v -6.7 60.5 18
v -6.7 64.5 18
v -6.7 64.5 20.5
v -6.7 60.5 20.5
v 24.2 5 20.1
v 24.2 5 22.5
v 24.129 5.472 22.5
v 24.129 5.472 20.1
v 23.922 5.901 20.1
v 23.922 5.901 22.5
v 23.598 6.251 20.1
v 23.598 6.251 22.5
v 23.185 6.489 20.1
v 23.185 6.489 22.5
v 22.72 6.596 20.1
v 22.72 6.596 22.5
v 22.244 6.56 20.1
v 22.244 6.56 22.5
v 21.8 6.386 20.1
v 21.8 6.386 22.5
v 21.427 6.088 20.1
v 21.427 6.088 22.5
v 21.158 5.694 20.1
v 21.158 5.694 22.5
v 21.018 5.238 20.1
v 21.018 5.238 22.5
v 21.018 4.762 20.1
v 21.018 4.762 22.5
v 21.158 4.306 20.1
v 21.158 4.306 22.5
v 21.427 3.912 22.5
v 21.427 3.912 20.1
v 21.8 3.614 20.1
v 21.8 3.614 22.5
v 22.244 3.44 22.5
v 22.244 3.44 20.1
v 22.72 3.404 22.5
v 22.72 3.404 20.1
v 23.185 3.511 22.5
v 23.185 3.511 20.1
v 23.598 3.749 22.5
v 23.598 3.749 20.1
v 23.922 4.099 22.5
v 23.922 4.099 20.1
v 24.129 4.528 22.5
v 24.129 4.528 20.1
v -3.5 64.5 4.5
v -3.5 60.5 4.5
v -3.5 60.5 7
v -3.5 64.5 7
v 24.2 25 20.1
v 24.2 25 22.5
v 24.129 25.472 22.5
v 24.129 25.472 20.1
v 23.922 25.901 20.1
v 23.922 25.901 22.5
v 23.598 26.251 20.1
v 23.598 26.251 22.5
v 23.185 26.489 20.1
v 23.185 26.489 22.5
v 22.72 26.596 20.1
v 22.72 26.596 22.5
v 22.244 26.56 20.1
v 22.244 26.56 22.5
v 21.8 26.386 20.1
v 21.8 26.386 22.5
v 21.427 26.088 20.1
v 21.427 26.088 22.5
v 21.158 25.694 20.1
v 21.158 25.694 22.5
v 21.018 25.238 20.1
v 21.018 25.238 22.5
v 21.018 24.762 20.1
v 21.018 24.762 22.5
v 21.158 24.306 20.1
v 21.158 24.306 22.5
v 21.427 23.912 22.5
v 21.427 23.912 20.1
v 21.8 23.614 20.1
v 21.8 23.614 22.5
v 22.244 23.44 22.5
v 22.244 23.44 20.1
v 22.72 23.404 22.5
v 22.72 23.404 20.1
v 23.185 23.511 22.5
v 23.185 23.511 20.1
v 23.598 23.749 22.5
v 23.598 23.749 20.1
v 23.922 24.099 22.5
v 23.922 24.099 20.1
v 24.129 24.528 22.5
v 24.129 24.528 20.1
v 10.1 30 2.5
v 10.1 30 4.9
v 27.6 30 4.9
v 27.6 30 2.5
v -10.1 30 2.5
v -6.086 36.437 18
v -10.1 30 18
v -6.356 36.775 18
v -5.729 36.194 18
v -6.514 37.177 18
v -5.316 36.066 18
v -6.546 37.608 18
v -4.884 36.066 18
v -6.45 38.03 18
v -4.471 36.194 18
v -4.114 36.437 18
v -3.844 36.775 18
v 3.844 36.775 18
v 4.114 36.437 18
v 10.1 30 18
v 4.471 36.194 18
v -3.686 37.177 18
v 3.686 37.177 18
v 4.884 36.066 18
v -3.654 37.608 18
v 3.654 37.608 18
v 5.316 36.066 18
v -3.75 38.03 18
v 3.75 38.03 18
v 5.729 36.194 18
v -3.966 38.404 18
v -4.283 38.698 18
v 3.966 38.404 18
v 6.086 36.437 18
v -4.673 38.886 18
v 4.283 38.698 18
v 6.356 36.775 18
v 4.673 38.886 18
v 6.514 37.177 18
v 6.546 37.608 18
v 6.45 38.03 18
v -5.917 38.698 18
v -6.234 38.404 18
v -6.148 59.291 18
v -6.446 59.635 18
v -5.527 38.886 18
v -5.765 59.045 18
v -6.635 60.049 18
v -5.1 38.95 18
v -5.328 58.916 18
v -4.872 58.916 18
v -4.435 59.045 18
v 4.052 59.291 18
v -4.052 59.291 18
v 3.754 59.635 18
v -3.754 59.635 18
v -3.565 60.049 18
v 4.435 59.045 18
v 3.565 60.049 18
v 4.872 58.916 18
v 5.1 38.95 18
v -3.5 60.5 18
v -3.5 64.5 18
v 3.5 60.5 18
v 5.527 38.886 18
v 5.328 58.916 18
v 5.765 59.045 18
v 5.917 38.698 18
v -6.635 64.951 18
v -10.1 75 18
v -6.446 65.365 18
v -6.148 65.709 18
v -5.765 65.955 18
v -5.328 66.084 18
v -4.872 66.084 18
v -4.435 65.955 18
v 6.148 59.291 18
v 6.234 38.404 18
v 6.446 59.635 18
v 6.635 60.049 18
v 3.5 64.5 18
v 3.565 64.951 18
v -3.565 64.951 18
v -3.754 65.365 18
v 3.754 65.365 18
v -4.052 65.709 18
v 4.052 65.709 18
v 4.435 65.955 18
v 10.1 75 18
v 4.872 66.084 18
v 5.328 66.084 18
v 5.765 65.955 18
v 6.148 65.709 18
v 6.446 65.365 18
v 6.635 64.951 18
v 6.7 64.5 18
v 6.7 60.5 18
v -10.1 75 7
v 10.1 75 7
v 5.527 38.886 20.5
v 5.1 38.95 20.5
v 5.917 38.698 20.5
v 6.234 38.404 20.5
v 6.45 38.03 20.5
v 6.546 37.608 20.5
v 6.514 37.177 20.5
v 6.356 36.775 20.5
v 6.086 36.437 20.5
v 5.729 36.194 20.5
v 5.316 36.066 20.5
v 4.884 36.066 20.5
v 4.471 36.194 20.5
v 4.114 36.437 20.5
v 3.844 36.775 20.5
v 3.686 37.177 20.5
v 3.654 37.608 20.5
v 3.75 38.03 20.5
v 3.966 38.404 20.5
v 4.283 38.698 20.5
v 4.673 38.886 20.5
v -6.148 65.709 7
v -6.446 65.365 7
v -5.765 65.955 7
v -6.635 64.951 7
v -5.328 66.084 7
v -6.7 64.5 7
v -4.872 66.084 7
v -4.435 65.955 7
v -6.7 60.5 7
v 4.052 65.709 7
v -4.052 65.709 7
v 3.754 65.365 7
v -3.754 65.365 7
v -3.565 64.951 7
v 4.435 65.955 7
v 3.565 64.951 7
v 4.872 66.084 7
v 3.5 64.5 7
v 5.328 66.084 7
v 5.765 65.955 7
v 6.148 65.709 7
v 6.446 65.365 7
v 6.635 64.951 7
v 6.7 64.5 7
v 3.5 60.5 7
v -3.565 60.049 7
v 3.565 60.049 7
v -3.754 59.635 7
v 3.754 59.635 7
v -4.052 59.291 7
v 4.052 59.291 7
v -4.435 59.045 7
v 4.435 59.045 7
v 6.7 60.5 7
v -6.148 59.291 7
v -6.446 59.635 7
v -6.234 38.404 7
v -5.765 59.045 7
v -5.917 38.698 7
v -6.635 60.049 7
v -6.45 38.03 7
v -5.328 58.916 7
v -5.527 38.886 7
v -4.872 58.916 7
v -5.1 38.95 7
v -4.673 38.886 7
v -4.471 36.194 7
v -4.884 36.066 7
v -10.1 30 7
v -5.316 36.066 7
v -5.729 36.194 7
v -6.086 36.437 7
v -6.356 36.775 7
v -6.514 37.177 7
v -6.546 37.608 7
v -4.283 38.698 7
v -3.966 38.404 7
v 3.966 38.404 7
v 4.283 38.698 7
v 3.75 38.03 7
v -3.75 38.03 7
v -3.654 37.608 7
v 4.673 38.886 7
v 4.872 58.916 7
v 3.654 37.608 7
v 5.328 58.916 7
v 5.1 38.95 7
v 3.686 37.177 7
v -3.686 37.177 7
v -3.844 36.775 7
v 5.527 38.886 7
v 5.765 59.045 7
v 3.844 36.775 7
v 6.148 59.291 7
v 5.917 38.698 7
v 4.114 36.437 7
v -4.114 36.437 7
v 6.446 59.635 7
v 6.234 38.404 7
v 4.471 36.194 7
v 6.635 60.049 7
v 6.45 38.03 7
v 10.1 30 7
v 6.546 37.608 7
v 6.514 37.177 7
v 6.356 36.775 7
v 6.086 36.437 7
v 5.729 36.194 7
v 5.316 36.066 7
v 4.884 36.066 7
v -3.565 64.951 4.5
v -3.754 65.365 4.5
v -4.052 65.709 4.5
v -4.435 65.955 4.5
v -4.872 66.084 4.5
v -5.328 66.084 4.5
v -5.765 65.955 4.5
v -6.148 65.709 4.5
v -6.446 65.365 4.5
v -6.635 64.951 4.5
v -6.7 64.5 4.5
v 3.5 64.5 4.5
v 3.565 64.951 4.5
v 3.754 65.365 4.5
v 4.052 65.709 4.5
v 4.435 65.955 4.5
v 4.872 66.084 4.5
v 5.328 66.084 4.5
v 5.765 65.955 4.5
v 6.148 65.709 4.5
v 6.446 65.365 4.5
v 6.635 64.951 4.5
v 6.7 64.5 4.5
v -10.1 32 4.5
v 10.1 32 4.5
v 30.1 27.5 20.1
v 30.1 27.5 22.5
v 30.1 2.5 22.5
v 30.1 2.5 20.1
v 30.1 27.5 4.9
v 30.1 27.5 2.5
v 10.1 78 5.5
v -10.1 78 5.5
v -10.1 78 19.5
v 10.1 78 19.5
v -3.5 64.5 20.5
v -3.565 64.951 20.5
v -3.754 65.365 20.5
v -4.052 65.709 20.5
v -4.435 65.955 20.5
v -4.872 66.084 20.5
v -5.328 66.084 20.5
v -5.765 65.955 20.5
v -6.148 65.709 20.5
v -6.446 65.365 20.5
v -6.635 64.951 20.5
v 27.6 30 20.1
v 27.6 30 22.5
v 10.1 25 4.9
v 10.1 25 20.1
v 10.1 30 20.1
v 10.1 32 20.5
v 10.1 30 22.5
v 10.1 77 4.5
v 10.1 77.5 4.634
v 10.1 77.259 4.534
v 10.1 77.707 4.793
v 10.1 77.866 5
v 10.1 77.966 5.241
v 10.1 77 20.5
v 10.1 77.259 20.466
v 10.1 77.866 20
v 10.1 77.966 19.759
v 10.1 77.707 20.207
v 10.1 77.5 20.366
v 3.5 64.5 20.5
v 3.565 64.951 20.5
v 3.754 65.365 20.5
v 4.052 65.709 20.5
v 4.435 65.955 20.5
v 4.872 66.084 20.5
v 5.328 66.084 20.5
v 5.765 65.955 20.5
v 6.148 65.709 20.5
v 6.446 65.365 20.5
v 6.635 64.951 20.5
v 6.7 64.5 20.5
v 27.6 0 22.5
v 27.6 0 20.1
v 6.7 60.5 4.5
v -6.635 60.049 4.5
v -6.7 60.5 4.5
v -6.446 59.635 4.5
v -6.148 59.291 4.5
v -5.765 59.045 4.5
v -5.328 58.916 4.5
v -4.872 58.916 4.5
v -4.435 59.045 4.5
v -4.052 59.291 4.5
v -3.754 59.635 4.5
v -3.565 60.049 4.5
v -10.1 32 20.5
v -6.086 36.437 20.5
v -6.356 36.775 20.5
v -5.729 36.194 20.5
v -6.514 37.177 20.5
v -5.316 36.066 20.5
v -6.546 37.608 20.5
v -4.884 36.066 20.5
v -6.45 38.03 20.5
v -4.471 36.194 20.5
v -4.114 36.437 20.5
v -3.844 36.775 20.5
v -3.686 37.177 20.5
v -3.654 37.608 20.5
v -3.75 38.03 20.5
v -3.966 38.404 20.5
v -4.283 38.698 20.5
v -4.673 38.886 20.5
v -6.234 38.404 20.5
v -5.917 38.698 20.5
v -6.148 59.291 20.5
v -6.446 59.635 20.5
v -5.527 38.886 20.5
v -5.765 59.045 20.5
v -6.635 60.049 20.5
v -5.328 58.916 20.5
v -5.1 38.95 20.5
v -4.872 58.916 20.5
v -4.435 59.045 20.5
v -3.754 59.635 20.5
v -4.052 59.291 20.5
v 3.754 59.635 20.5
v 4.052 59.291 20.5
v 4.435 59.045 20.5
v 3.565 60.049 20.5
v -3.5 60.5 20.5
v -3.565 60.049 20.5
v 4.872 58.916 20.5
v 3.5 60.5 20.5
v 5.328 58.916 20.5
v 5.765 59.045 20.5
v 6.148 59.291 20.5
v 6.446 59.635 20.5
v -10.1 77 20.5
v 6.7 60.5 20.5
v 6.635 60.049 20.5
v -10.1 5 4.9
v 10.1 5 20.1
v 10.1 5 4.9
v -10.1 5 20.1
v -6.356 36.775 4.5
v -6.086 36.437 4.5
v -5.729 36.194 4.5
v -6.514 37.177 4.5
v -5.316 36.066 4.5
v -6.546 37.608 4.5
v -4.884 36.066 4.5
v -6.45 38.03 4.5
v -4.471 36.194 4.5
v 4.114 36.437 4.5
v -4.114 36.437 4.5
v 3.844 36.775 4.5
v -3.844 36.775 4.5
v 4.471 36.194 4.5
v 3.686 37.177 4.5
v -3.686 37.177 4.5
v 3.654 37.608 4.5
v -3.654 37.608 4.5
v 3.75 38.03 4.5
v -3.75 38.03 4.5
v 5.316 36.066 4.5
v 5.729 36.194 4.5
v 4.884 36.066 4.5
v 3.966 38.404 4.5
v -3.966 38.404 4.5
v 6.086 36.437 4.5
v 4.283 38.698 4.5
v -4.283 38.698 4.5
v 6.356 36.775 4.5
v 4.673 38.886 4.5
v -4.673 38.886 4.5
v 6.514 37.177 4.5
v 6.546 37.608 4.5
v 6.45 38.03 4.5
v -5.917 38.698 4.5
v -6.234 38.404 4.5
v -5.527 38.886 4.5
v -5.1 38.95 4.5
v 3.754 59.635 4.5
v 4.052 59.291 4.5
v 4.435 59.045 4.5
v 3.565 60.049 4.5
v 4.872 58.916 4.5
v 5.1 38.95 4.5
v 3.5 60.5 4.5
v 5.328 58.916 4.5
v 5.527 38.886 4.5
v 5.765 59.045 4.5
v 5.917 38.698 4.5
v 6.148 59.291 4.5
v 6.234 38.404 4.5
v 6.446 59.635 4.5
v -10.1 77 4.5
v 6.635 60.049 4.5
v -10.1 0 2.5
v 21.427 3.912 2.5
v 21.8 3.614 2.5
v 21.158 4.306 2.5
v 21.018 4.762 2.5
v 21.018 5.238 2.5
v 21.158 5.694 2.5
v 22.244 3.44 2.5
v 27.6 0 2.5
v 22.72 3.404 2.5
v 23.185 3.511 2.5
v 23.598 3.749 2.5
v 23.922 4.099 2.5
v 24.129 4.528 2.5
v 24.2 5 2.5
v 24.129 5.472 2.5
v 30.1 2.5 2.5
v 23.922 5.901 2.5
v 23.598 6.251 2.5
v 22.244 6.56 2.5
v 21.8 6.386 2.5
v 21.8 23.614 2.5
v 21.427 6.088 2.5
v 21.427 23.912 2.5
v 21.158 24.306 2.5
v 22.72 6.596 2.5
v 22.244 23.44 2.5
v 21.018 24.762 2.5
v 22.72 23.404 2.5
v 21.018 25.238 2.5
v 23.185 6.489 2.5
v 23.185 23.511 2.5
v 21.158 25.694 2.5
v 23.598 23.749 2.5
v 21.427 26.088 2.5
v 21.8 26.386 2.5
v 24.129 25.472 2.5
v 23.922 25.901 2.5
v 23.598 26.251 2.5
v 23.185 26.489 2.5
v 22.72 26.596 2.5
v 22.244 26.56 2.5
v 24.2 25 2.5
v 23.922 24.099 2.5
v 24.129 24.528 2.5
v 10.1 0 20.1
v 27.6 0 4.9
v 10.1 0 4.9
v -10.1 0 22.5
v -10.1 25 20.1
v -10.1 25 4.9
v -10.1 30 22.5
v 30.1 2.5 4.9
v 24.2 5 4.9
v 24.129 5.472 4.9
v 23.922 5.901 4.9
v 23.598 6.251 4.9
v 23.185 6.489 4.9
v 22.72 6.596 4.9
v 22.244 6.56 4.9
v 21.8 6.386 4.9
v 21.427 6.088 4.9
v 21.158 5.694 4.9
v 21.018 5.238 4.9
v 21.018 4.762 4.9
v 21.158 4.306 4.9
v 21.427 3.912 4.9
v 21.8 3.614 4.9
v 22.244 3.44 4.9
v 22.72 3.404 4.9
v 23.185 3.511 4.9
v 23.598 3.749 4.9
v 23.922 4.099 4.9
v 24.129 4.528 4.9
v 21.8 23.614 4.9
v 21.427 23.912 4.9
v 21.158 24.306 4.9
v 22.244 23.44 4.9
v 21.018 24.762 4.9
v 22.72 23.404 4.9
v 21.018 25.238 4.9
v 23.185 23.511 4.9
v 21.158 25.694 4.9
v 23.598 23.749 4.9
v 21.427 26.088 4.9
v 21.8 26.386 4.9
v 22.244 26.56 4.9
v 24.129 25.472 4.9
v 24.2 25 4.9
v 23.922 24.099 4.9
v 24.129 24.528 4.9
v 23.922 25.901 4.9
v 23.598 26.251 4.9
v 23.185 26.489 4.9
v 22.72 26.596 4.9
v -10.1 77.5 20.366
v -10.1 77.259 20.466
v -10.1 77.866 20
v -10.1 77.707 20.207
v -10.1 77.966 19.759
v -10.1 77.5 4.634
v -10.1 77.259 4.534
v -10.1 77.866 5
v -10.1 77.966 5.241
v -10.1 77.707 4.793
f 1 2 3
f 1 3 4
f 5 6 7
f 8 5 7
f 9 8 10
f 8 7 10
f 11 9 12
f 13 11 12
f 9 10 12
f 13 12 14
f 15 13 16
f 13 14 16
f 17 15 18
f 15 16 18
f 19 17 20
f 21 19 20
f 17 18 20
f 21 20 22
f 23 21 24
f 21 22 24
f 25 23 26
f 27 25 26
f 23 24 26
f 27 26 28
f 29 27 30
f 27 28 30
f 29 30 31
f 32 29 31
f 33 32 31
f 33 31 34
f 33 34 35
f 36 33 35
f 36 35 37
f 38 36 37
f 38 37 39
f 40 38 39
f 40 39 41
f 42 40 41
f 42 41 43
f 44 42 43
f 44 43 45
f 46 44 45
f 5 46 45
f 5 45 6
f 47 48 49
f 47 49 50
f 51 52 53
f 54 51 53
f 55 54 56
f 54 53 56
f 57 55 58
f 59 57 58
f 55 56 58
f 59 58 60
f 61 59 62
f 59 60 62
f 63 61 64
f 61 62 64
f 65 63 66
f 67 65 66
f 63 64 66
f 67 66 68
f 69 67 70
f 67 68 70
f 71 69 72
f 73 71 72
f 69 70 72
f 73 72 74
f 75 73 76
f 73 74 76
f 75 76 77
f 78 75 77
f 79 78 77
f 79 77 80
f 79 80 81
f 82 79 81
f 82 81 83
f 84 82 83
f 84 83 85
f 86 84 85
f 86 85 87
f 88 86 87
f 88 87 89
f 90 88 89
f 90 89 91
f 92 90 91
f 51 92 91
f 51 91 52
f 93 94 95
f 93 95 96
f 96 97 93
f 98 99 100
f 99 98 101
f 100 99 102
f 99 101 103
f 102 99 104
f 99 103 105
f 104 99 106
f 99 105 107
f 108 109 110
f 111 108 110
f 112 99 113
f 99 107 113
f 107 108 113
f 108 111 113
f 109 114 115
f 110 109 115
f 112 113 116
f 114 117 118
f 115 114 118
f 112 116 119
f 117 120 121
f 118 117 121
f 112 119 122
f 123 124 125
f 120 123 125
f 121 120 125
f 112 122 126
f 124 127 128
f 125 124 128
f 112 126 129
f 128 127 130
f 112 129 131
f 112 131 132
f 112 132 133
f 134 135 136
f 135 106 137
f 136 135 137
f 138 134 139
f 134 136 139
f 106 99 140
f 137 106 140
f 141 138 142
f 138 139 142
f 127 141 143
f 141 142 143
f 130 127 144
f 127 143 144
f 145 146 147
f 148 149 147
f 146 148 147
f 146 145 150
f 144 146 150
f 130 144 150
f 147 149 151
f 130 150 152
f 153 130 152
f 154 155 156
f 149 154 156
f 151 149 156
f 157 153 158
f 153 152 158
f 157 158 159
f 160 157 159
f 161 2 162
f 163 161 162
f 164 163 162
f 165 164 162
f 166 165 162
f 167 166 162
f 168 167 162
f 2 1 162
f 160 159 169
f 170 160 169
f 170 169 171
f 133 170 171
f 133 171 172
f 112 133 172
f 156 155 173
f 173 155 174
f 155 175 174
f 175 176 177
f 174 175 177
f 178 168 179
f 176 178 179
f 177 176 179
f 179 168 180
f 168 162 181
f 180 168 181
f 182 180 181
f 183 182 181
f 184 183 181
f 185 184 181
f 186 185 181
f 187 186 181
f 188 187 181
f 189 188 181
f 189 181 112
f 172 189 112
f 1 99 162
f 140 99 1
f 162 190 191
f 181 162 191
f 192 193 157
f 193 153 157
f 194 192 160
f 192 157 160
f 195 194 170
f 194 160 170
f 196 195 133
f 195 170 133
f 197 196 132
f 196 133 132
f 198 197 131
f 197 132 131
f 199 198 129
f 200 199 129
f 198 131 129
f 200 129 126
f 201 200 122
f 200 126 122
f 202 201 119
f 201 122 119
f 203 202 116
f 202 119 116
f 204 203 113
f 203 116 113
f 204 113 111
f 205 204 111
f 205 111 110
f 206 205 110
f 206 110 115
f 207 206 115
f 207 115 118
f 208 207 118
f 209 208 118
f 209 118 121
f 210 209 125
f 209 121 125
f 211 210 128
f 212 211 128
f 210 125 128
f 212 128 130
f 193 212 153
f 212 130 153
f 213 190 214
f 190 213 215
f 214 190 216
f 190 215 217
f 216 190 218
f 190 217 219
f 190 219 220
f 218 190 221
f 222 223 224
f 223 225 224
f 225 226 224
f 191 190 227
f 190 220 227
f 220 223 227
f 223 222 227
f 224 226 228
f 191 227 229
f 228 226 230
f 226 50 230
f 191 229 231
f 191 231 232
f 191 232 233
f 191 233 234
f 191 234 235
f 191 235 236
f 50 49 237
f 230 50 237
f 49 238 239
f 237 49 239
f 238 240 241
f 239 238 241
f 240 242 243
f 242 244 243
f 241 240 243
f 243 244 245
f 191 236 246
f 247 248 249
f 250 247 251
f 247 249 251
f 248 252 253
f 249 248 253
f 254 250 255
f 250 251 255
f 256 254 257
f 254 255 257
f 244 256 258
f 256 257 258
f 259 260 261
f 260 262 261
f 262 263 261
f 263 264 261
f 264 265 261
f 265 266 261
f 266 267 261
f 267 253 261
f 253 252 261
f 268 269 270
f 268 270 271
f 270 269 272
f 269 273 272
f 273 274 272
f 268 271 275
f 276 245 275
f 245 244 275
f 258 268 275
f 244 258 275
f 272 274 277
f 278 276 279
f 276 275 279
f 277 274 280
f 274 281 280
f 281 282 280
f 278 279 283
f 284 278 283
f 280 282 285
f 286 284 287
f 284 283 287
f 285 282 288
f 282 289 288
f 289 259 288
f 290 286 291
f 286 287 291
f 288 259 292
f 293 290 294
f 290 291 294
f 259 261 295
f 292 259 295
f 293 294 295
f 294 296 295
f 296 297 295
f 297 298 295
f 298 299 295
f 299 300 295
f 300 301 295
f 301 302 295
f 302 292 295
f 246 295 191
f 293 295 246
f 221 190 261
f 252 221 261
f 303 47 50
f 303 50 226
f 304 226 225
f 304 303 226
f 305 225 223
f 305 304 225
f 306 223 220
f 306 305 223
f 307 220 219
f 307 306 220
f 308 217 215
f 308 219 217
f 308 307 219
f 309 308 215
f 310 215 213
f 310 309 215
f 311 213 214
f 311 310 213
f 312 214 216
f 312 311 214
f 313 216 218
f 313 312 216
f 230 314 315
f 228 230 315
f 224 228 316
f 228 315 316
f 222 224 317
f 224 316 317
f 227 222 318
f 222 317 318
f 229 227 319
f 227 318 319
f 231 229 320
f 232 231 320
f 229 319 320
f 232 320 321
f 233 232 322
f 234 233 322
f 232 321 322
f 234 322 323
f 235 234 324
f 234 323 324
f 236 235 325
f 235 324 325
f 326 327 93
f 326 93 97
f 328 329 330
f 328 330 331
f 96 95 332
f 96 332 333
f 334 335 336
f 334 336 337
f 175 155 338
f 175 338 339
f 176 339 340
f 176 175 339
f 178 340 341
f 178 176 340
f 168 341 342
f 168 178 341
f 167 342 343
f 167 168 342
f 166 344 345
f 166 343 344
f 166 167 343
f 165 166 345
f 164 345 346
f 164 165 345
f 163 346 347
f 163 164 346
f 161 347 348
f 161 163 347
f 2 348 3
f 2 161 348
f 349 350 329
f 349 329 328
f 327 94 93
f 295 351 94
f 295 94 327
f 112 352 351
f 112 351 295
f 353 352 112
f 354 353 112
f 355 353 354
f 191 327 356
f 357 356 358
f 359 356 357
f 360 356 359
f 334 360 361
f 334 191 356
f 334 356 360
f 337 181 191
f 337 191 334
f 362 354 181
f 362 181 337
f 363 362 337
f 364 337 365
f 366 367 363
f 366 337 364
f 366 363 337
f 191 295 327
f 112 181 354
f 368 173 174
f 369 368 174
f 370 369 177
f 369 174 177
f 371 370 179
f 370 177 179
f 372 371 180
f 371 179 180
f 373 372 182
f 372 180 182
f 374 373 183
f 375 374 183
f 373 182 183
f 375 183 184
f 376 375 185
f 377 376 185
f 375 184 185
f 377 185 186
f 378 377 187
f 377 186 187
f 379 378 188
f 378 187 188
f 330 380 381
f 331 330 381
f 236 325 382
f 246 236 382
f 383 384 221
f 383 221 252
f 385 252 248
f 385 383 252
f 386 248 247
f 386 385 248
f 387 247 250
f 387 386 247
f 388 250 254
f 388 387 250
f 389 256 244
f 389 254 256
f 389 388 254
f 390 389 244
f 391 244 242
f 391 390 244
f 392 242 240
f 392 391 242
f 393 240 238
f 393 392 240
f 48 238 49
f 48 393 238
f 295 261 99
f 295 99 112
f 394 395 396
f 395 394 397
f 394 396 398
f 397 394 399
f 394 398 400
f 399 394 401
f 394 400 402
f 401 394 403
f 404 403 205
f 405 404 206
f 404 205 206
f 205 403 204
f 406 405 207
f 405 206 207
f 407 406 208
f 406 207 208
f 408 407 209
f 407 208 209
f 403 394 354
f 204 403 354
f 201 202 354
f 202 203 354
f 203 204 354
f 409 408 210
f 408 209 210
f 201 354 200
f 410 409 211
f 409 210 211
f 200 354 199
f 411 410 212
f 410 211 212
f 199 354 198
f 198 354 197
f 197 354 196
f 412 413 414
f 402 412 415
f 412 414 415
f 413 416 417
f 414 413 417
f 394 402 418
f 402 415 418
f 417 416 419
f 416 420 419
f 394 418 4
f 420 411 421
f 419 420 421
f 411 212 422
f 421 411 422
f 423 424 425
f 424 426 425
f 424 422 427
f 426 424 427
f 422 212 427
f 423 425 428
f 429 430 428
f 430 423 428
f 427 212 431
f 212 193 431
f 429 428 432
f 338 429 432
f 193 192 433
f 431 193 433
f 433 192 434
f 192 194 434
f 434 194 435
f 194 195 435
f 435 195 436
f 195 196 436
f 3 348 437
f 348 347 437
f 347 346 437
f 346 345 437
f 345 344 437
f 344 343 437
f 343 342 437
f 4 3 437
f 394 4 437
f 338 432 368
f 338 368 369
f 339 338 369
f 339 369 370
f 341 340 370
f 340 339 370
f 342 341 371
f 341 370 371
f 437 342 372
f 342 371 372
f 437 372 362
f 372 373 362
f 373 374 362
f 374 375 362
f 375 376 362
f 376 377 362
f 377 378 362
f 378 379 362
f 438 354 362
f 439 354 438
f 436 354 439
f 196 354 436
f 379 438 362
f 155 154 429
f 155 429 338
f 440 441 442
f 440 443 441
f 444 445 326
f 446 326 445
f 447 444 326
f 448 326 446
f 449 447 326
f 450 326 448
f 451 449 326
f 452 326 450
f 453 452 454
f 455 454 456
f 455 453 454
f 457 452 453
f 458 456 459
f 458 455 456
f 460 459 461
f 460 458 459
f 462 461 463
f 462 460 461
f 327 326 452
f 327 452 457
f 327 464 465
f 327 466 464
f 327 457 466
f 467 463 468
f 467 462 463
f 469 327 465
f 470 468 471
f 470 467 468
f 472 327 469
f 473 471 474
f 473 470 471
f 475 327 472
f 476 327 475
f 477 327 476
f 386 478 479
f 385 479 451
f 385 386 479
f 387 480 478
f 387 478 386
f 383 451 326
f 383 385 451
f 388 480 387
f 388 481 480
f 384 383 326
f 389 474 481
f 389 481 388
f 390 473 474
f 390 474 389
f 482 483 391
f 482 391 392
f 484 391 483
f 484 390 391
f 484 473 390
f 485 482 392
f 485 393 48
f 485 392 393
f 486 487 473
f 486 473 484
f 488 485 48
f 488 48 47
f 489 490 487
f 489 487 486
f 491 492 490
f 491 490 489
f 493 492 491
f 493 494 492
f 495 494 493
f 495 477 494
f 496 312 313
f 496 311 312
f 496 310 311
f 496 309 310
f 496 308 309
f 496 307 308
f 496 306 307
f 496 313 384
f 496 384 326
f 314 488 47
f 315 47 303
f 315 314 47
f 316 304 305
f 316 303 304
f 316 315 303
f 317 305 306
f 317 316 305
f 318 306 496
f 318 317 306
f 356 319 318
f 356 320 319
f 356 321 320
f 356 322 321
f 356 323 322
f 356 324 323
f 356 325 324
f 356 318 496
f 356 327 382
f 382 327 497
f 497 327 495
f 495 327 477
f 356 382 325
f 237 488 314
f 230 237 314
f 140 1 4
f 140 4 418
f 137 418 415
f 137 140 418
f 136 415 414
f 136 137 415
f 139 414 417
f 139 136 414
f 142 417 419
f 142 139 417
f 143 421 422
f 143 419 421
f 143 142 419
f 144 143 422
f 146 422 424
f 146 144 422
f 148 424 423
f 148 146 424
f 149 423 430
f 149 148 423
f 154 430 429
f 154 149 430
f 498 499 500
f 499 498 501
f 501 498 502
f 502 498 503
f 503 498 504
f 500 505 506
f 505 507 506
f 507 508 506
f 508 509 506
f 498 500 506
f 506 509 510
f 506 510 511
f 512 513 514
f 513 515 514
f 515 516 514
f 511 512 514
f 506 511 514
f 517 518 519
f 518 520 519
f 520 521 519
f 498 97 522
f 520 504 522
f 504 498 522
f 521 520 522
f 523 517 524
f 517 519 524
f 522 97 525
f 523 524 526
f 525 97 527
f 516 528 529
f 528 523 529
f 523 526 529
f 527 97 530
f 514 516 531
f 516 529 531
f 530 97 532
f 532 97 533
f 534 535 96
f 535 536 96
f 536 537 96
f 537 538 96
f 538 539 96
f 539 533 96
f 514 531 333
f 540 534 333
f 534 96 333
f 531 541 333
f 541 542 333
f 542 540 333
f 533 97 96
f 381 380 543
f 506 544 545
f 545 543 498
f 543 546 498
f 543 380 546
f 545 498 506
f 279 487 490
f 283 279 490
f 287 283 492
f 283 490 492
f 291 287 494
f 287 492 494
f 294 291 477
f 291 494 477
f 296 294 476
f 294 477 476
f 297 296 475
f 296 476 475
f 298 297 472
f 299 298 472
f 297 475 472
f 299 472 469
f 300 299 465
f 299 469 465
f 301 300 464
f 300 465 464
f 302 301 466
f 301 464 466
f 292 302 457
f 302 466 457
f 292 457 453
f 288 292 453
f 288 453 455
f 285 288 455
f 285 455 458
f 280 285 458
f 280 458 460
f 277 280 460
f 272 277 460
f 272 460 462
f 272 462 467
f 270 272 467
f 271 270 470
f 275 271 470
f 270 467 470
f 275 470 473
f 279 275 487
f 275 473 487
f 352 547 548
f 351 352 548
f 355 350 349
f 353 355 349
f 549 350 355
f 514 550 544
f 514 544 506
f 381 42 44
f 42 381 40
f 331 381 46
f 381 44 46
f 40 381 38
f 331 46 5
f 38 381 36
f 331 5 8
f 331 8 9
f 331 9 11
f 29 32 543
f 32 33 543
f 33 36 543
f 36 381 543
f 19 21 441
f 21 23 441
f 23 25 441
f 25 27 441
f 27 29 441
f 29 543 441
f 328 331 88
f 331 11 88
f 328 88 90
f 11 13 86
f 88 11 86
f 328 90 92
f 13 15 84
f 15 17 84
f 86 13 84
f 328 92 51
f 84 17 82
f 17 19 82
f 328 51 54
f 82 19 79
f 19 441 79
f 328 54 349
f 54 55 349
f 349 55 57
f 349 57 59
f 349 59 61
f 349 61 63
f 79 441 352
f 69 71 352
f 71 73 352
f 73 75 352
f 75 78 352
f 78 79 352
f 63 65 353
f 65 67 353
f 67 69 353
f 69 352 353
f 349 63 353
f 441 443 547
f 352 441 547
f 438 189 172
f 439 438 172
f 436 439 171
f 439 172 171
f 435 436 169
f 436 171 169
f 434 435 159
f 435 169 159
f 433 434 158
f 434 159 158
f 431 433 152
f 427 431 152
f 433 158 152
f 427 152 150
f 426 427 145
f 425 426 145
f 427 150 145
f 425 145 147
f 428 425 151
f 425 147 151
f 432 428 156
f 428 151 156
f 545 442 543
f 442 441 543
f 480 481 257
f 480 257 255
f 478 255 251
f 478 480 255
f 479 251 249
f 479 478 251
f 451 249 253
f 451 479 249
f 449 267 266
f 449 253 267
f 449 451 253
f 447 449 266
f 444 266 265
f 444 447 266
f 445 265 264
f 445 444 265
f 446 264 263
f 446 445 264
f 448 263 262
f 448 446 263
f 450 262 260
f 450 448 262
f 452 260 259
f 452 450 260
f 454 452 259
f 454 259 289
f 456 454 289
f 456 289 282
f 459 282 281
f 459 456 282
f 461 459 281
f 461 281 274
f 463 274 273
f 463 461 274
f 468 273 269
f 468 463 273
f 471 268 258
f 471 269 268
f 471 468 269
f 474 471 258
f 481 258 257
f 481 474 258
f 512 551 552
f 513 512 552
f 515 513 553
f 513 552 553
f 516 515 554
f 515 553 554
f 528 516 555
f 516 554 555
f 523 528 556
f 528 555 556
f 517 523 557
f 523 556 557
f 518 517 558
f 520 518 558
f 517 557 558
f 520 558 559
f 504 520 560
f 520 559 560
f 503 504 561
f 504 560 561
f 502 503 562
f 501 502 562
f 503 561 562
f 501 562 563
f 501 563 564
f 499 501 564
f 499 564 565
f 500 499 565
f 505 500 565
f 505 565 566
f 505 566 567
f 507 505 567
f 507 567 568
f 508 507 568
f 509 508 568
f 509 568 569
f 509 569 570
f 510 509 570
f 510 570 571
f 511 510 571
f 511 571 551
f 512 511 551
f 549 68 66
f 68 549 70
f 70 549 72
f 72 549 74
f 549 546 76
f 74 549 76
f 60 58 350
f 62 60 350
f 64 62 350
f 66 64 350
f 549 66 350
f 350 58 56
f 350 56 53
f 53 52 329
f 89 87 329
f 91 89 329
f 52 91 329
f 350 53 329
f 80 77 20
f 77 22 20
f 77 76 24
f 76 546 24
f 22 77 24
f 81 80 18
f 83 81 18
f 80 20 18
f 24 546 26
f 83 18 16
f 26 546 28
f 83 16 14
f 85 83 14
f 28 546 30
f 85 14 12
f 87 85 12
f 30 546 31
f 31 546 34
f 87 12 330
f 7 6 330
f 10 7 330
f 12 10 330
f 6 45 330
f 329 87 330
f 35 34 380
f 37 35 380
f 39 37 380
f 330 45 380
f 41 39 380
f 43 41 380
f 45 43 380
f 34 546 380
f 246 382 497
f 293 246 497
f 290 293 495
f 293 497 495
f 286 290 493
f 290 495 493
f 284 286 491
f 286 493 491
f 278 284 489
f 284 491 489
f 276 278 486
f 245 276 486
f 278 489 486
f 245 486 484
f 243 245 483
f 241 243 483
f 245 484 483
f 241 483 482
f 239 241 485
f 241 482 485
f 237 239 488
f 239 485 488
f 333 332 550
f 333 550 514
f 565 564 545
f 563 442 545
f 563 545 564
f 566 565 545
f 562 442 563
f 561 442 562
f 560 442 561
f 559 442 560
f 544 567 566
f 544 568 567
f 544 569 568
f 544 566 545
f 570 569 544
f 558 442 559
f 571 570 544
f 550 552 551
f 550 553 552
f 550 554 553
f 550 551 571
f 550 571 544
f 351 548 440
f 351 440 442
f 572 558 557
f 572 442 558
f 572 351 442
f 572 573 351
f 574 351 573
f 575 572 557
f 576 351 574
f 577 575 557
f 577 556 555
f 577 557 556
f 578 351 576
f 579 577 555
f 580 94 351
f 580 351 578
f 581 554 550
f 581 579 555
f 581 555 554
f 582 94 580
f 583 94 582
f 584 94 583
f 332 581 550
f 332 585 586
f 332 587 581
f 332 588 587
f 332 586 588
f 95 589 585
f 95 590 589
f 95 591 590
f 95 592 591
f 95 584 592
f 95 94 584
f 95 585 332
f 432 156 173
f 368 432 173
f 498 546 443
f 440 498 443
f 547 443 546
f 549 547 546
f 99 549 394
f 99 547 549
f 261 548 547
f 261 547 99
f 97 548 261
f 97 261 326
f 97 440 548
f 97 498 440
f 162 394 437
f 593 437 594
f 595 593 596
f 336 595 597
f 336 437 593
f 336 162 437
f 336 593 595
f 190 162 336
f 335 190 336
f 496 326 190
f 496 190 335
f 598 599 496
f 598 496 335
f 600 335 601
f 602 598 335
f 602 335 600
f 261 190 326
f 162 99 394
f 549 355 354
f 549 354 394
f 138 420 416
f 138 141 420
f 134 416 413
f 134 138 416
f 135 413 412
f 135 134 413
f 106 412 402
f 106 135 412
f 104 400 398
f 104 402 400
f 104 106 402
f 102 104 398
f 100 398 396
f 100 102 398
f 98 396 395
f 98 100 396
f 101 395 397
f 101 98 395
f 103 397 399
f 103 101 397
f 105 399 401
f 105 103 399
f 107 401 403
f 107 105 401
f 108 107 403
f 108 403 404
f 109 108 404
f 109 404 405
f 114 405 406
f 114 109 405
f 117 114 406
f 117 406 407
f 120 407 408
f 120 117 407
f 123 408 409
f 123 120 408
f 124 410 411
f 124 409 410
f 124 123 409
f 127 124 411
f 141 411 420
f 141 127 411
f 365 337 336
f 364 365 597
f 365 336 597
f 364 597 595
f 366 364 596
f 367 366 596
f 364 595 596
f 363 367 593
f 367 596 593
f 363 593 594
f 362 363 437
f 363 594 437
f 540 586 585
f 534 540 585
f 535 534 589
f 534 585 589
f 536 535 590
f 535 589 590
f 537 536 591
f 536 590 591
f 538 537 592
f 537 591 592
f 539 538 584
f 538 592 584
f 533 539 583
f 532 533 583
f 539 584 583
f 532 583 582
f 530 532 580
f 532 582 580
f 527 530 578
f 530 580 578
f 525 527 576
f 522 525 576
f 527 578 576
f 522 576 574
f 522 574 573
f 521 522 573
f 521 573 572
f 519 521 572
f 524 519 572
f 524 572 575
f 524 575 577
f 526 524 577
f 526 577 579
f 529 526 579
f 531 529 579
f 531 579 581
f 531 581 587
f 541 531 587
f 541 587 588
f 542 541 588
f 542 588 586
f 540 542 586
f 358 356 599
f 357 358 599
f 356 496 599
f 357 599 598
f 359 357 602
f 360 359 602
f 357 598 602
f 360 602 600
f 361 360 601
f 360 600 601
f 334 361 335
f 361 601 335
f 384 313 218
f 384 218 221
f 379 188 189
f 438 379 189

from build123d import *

# Parameters (mm, degrees)
EXTRUDE_1_DEPTH      = 30
SKETCH_2_W           = 20.2
SKETCH_2_H           = 50
EXTRUDE_1_2_DEPTH    = 20
SKETCH_3_W           = 20.2
SKETCH_3_H           = 11
CUT_EXTRUDE_1_DEPTH  = 20
CUT_EXTRUDE_2_REACH  = 60.432
SKETCH_4_W           = 11
SKETCH_4_H           = 20
SKETCH_5_W           = 20.2
SKETCH_5_H           = 4.5
EXTRUDE_2_DEPTH      = 25
CUT_EXTRUDE_4_REACH  = 80.275
CUT_EXTRUDE_5_REACH  = 82.278
SKETCH_9_R           = 1.6
SKETCH_10_W          = 20.2
SKETCH_10_H          = 20
EXTRUDE_3_DEPTH      = 3
CUT_EXTRUDE_6_REACH  = 55.965
SKETCH_12_W          = 20.2
SKETCH_12_H          = 30
EXTRUDE_4_DEPTH      = 2
SKETCH_13_W          = 20.2
SKETCH_13_H          = 30
EXTRUDE_5_DEPTH      = 2
CUT_EXTRUDE_START    = -20.2
SKETCH_15_W          = 15.2
SKETCH_15_H          = 20
CUT_EXTRUDE_7_DEPTH  = 20.2
SKETCH_16_W          = 4.4
SKETCH_16_H          = 30
SKETCH_16_W_2        = 5.4
EXTRUDE_6_DEPTH      = 20
CUT_EXTRUDE_8_REACH  = 88.983
SKETCH_17_R          = 1.6
CHAMFER_1_SIZE       = 2.5
CUT_EXTRUDE_9_REACH  = 89.122
SKETCH_18_W          = 46.30929367
SKETCH_18_H          = 3
SKETCH_20_W          = 20.2
SKETCH_20_H          = 20
EXTRUDE_7_DEPTH      = 2.1
SKETCH_21_W          = 20.2
SKETCH_21_H          = 20
EXTRUDE_8_DEPTH      = 2.1
SKETCH_22_W          = 46.206629154
SKETCH_22_H          = 1
CUT_EXTRUDE_10_DEPTH = 30
SKETCH_23_W          = 42.922328926
SKETCH_23_H          = 4
CUT_EXTRUDE_11_DEPTH = 30
CUT_EXTRUDE_12_REACH = 85.656
SKETCH_24_W          = 4
SKETCH_24_H          = 48
SKETCH_25_W          = 15.2
SKETCH_25_H          = 20
CUT_EXTRUDE_13_DEPTH = 20.2
SKETCH_26_W          = 20.2
SKETCH_26_H          = 20
EXTRUDE_9_DEPTH      = 1
CHAMFER_2_SIZE       = 2
FILLET_1_R           = 1
CUT_EXTRUDE_14_DEPTH = 1


with BuildPart() as part:
    # 草图1 → Extrude 1 (new body)
    with BuildSketch(Plane(origin=(0, 0, 0), x_dir=(1, 0, 0), z_dir=(0, 1, 0))):
        Polygon((-7.6, 15), (-7.6, 0), (7.6, 0), (7.6, 15), (10.1, 15), (10.1, -2.5), (-10.1, -2.5), (-10.1, 15), align=None)
    extrude(amount=EXTRUDE_1_DEPTH)

    # 草图2 → Extrude 1 2 (add)
    with BuildSketch(Plane.XY.offset(2.5)):
        with Locations((0, 25)):
            Rectangle(SKETCH_2_W, SKETCH_2_H)
    extrude(amount=EXTRUDE_1_2_DEPTH)

    # 草图3 → 切除-拉伸1 (cut)
    with BuildSketch(Plane(origin=(0, 50, 0), x_dir=(1, 0, 0), z_dir=(0, 1, 0))):
        with Locations((0, -12.5)):
            Rectangle(SKETCH_3_W, SKETCH_3_H)
    extrude(amount=-CUT_EXTRUDE_1_DEPTH, mode=Mode.SUBTRACT)

    # 草图4 → 切除-拉伸2 (cut, up to next)
    with BuildSketch(Plane(origin=(10.1, 0, 0), x_dir=(0, 0, -1), z_dir=(1, 0, 0)), mode=Mode.PRIVATE) as cut_extrude_2_sk1:
        with Locations((-12.5, 15)):
            Rectangle(SKETCH_4_W, SKETCH_4_H)
    cut_extrude_2_tool1 = extrude(cut_extrude_2_sk1.sketch, amount=-CUT_EXTRUDE_2_REACH, mode=Mode.PRIVATE) & part.part
    add(cut_extrude_2_tool1.solids().sort_by_distance((10.1, 15, 12.5))[0], mode=Mode.SUBTRACT)

    # 草图5 → 凸台-拉伸2 (add)
    with BuildSketch(Plane(origin=(0, 50, 0), x_dir=(1, 0, 0), z_dir=(0, 1, 0))):
        with Locations((0, -4.75)):
            Rectangle(SKETCH_5_W, SKETCH_5_H)
        with Locations((0, -20.25)):
            Rectangle(SKETCH_5_W, SKETCH_5_H)
    extrude(amount=EXTRUDE_2_DEPTH)

    # 草图7 → M3.5 螺纹孔1 (revolve, cut)
    with BuildSketch(Plane(origin=(-5.1, 37.5, 2.5), x_dir=(0, 1, 0), z_dir=(1, 0, 0))):
        Polygon((0, 0), (0, 40.871247898), (1.45, 40), (1.45, 0), align=None)
    hole_wizard_m3_5_1 = revolve(axis=Axis((-5.1, 37.5, -3.85), (0, 0, 1)), mode=Mode.SUBTRACT)

    # 切除-拉伸4: up to this face of the body (flat: up to its plane)
    cut_extrude_4_end = Plane(part.part.faces().sort_by_distance((0.022332689, 37.5, 22.5))[0])
    # 草图8 → 切除-拉伸4 (cut, up to the picked face)
    with BuildSketch(Plane(origin=(0, 0, 2.5), x_dir=(-1, 0, 0), z_dir=(0, 0, -1)), mode=Mode.PRIVATE) as cut_extrude_4_sk1:
        with BuildLine():
            Line((3.5, 60.5), (3.5, 64.5))
            ThreePointArc((3.5, 64.5), (5.1, 66.1), (6.7, 64.5))
            Line((6.7, 64.5), (6.7, 60.5))
            ThreePointArc((6.7, 60.5), (5.1, 58.9), (3.5, 60.5))
        make_face()
    cut_extrude_4_tool1 = split(extrude(cut_extrude_4_sk1.sketch, amount=-CUT_EXTRUDE_4_REACH, mode=Mode.PRIVATE), bisect_by=cut_extrude_4_end, keep=Keep.BOTH, mode=Mode.PRIVATE)
    cut_extrude_4 = cut_extrude_4_tool1.solids().sort_by(Axis((-5.1, 62.5, 2.5), (0, 0, 1)))[0]
    add(cut_extrude_4, mode=Mode.SUBTRACT)

    # 草图9 → 切除-拉伸5 (cut, up to next)
    with BuildSketch(Plane(origin=(-7.6, 0, 0), x_dir=(0, 0, -1), z_dir=(1, 0, 0)), mode=Mode.PRIVATE) as cut_extrude_5_sk1:
        with Locations((7.5, 25)):
            Circle(SKETCH_9_R)
    cut_extrude_5_tool1 = extrude(cut_extrude_5_sk1.sketch, amount=-CUT_EXTRUDE_5_REACH, mode=Mode.PRIVATE) & part.part
    # 草图9 → 切除-拉伸5 (cut, up to next)
    with BuildSketch(Plane(origin=(-7.6, 0, 0), x_dir=(0, 0, -1), z_dir=(1, 0, 0)), mode=Mode.PRIVATE) as cut_extrude_5_sk2:
        with Locations((7.5, 5)):
            Circle(SKETCH_9_R)
    cut_extrude_5_tool2 = extrude(cut_extrude_5_sk2.sketch, amount=-CUT_EXTRUDE_5_REACH, mode=Mode.PRIVATE) & part.part
    cut_extrude_5_1 = cut_extrude_5_tool1.solids().sort_by_distance((-7.6, 25, -7.5))[0]
    add(cut_extrude_5_1, mode=Mode.SUBTRACT)
    cut_extrude_5_2 = cut_extrude_5_tool2.solids().sort_by_distance((-7.6, 5, -7.5))[0]
    add(cut_extrude_5_2, mode=Mode.SUBTRACT)
    cut_extrude_5 = cut_extrude_5_1 + cut_extrude_5_2  # 切除-拉伸5 as one shape, for the pattern or mirror that repeats it

    # 镜向1: M3.5 螺纹孔1, 切除-拉伸4, 切除-拉伸5 across plane
    add(hole_wizard_m3_5_1.mirror(Plane(origin=(0, 0, 0), x_dir=(0, 0, 1), z_dir=(1, 0, 0))), mode=Mode.SUBTRACT)
    add(cut_extrude_4.mirror(Plane(origin=(0, 0, 0), x_dir=(0, 0, 1), z_dir=(1, 0, 0))), mode=Mode.SUBTRACT)
    add(cut_extrude_5.mirror(Plane(origin=(0, 0, 0), x_dir=(0, 0, 1), z_dir=(1, 0, 0))), mode=Mode.SUBTRACT)

    # 草图10 → 凸台-拉伸3 (add)
    with BuildSketch(Plane(origin=(0, 75, 0), x_dir=(1, 0, 0), z_dir=(0, 1, 0))):
        with Locations((0, -12.5)):
            Rectangle(SKETCH_10_W, SKETCH_10_H)
    extrude(amount=EXTRUDE_3_DEPTH)

    # 草图11 → 切除-拉伸6 (cut, up to next)
    with BuildSketch(Plane(origin=(0, 30, 0), x_dir=(1, 0, 0), z_dir=(0, 1, 0)), mode=Mode.PRIVATE) as cut_extrude_6_sk1:
        Polygon((10.1, -2.5), (10.1, 15), (7.6, 15), (7.6, 0), (-7.6, 0), (-7.6, 15), (-10.1, 15), (-10.1, -2.5), align=None)
    cut_extrude_6_tool1 = extrude(cut_extrude_6_sk1.sketch, amount=-CUT_EXTRUDE_6_REACH, mode=Mode.PRIVATE) & part.part
    add(cut_extrude_6_tool1.solids().sort_by_distance((9.832738, 30, -6.25))[0], mode=Mode.SUBTRACT)

    # 草图12 → 凸台-拉伸4 (add)
    with BuildSketch(Plane.XY.offset(22.5)):
        with Locations((0, 15)):
            Rectangle(SKETCH_12_W, SKETCH_12_H)
    extrude(amount=EXTRUDE_4_DEPTH)

    # 草图13 → 凸台-拉伸5 (add)
    with BuildSketch(Plane(origin=(0, 0, 2.5), x_dir=(-1, 0, 0), z_dir=(0, 0, -1))):
        with Locations((0, 15)):
            Rectangle(SKETCH_13_W, SKETCH_13_H)
    extrude(amount=EXTRUDE_5_DEPTH)

    # 草图15 → 切除-拉伸7 (cut)
    with BuildSketch(Plane(origin=(10.1, 0, 0), x_dir=(0, 0, -1), z_dir=(1, 0, 0)).offset(CUT_EXTRUDE_START)):
        with Locations((-12.5, 15)):
            Rectangle(SKETCH_15_W, SKETCH_15_H)
    extrude(amount=CUT_EXTRUDE_7_DEPTH, mode=Mode.SUBTRACT)

    # 草图16 → 凸台-拉伸6 (add)
    with BuildSketch(Plane(origin=(10.1, 0, 0), x_dir=(0, 0, -1), z_dir=(1, 0, 0))):
        with Locations((-22.3, 15)):
            Rectangle(SKETCH_16_W, SKETCH_16_H)
        with Locations((-3.2, 15)):
            Rectangle(SKETCH_16_W_2, SKETCH_16_H)
    extrude(amount=EXTRUDE_6_DEPTH)

    # 切除-拉伸8: up to this face of the body (flat: up to its plane)
    cut_extrude_8_end = Plane(part.part.faces().sort_by_distance((10, 15, 0.5))[0])
    # 草图17 → 切除-拉伸8 (cut, up to the picked face)
    with BuildSketch(Plane.XY.offset(24.5), mode=Mode.PRIVATE) as cut_extrude_8_sk1:
        with Locations((22.6, 25)):
            Circle(SKETCH_17_R)
    cut_extrude_8_tool1 = split(extrude(cut_extrude_8_sk1.sketch, amount=-CUT_EXTRUDE_8_REACH, mode=Mode.PRIVATE), bisect_by=cut_extrude_8_end, keep=Keep.BOTH, mode=Mode.PRIVATE)
    # 草图17 → 切除-拉伸8 (cut, up to the picked face)
    with BuildSketch(Plane.XY.offset(24.5), mode=Mode.PRIVATE) as cut_extrude_8_sk2:
        with Locations((22.6, 5)):
            Circle(SKETCH_17_R)
    cut_extrude_8_tool2 = split(extrude(cut_extrude_8_sk2.sketch, amount=-CUT_EXTRUDE_8_REACH, mode=Mode.PRIVATE), bisect_by=cut_extrude_8_end, keep=Keep.BOTH, mode=Mode.PRIVATE)
    add(cut_extrude_8_tool1.solids().sort_by(Axis((22.6, 25, 24.5), (0, 0, -1)))[0], mode=Mode.SUBTRACT)
    add(cut_extrude_8_tool2.solids().sort_by(Axis((22.6, 5, 24.5), (0, 0, -1)))[0], mode=Mode.SUBTRACT)

    # 倒角1
    chamfer_1_edges = [part.edges().sort_by_distance(p)[0] for p in [
        (30.1, 0, 22.3),
        (30.1, 0, 3.2),
        (30.1, 30, 3.2),
        (30.1, 30, 22.3),
    ]]
    chamfer(chamfer_1_edges, length=CHAMFER_1_SIZE)

    # 切除-拉伸9: up to this face of the body (flat: up to its plane)
    cut_extrude_9_end = Plane(part.part.faces().sort_by_distance((0, 78, 12.5))[0])
    # 草图18 → 切除-拉伸9 (cut, up to the picked face)
    with BuildSketch(Plane.XZ, mode=Mode.PRIVATE) as cut_extrude_9_sk1:
        with Locations((8.75, 0.5)):
            Rectangle(SKETCH_18_W, SKETCH_18_H)
    cut_extrude_9_tool1 = split(extrude(cut_extrude_9_sk1.sketch, amount=-CUT_EXTRUDE_9_REACH, mode=Mode.PRIVATE), bisect_by=cut_extrude_9_end, keep=Keep.BOTH, mode=Mode.PRIVATE)
    add(cut_extrude_9_tool1.solids().sort_by(Axis((8.75, 0, 0.5), (0, 1, 0)))[0], mode=Mode.SUBTRACT)

    # 草图20 → 凸台-拉伸7 (add)
    with BuildSketch(Plane.XY.offset(4.9)):
        with Locations((0, 15)):
            Rectangle(SKETCH_20_W, SKETCH_20_H)
    extrude(amount=EXTRUDE_7_DEPTH)

    # 草图21 → 凸台-拉伸8 (add)
    with BuildSketch(Plane(origin=(0, 0, 20.1), x_dir=(-1, 0, 0), z_dir=(0, 0, -1))):
        with Locations((0, 15)):
            Rectangle(SKETCH_21_W, SKETCH_21_H)
    extrude(amount=EXTRUDE_8_DEPTH)

    # 草图22 → 切除-拉伸10 (cut)
    with BuildSketch(Plane(origin=(0, 30, 0), x_dir=(1, 0, 0), z_dir=(0, 1, 0))):
        with Locations((8.75, -2)):
            Rectangle(SKETCH_22_W, SKETCH_22_H)
    extrude(amount=-CUT_EXTRUDE_10_DEPTH, mode=Mode.SUBTRACT)

    # 草图23 → 切除-拉伸11 (cut)
    with BuildSketch(Plane(origin=(0, 30, 0), x_dir=(1, 0, 0), z_dir=(0, 1, 0))):
        with Locations((8.75, -24.5)):
            Rectangle(SKETCH_23_W, SKETCH_23_H)
    extrude(amount=-CUT_EXTRUDE_11_DEPTH, mode=Mode.SUBTRACT)

    # 草图24 → 切除-拉伸12 (cut, up to next)
    with BuildSketch(Plane(origin=(10.1, 0, 0), x_dir=(0, 0, -1), z_dir=(1, 0, 0)), mode=Mode.PRIVATE) as cut_extrude_12_sk1:
        with Locations((-22.5, 54)):
            Rectangle(SKETCH_24_W, SKETCH_24_H)
    cut_extrude_12_tool1 = extrude(cut_extrude_12_sk1.sketch, amount=-CUT_EXTRUDE_12_REACH, mode=Mode.PRIVATE) & part.part
    # 草图24 → 切除-拉伸12 (cut, up to next)
    with BuildSketch(Plane(origin=(10.1, 0, 0), x_dir=(0, 0, -1), z_dir=(1, 0, 0)), mode=Mode.PRIVATE) as cut_extrude_12_sk2:
        with Locations((-2.5, 54)):
            Rectangle(SKETCH_24_W, SKETCH_24_H)
    cut_extrude_12_tool2 = extrude(cut_extrude_12_sk2.sketch, amount=-CUT_EXTRUDE_12_REACH, mode=Mode.PRIVATE) & part.part
    add(cut_extrude_12_tool1.solids().sort_by_distance((10.1, 54, 22.5))[0], mode=Mode.SUBTRACT)
    add(cut_extrude_12_tool2.solids().sort_by_distance((10.1, 54, 2.5))[0], mode=Mode.SUBTRACT)

    # 草图25 → 切除-拉伸13 (cut)
    with BuildSketch(Plane(origin=(10.1, 0, 0), x_dir=(0, 0, -1), z_dir=(1, 0, 0)).offset(CUT_EXTRUDE_START)):
        with Locations((-12.5, 15)):
            Rectangle(SKETCH_25_W, SKETCH_25_H)
    extrude(amount=CUT_EXTRUDE_13_DEPTH, mode=Mode.SUBTRACT)

    # 草图26 → 凸台-拉伸9 (add)
    with BuildSketch(Plane.XY.offset(4.9)):
        with Locations((0, 15)):
            Rectangle(SKETCH_26_W, SKETCH_26_H)
    extrude(amount=EXTRUDE_9_DEPTH)

    # 倒角2
    chamfer_2_edges = [part.edges().sort_by_distance(p)[0] for p in [
        (0, 30, 4.5),
        (0, 30, 20.5),
    ]]
    chamfer(chamfer_2_edges, length=CHAMFER_2_SIZE - 0.0001)  # a hair under: the kernel refuses the full size

    # 圆角1
    fillet_1_edges = [part.edges().sort_by_distance(p)[0] for p in [
        (0, 78, 20.5),
        (0, 78, 4.5),
    ]]
    fillet(fillet_1_edges, radius=FILLET_1_R)

    # 草图27 → 切除-拉伸14 (cut)
    with BuildSketch(Plane.XY.offset(5.9)):
        Polygon((10.1, 0), (27.6, 0), (30.1, 2.5), (30.1, 27.5), (27.6, 30), (10.1, 30), (10.1, 25), (-10.1, 25), (-10.1, 5), (10.1, 5), align=None)
    extrude(amount=-CUT_EXTRUDE_14_DEPTH, mode=Mode.SUBTRACT)


solid = part.part
